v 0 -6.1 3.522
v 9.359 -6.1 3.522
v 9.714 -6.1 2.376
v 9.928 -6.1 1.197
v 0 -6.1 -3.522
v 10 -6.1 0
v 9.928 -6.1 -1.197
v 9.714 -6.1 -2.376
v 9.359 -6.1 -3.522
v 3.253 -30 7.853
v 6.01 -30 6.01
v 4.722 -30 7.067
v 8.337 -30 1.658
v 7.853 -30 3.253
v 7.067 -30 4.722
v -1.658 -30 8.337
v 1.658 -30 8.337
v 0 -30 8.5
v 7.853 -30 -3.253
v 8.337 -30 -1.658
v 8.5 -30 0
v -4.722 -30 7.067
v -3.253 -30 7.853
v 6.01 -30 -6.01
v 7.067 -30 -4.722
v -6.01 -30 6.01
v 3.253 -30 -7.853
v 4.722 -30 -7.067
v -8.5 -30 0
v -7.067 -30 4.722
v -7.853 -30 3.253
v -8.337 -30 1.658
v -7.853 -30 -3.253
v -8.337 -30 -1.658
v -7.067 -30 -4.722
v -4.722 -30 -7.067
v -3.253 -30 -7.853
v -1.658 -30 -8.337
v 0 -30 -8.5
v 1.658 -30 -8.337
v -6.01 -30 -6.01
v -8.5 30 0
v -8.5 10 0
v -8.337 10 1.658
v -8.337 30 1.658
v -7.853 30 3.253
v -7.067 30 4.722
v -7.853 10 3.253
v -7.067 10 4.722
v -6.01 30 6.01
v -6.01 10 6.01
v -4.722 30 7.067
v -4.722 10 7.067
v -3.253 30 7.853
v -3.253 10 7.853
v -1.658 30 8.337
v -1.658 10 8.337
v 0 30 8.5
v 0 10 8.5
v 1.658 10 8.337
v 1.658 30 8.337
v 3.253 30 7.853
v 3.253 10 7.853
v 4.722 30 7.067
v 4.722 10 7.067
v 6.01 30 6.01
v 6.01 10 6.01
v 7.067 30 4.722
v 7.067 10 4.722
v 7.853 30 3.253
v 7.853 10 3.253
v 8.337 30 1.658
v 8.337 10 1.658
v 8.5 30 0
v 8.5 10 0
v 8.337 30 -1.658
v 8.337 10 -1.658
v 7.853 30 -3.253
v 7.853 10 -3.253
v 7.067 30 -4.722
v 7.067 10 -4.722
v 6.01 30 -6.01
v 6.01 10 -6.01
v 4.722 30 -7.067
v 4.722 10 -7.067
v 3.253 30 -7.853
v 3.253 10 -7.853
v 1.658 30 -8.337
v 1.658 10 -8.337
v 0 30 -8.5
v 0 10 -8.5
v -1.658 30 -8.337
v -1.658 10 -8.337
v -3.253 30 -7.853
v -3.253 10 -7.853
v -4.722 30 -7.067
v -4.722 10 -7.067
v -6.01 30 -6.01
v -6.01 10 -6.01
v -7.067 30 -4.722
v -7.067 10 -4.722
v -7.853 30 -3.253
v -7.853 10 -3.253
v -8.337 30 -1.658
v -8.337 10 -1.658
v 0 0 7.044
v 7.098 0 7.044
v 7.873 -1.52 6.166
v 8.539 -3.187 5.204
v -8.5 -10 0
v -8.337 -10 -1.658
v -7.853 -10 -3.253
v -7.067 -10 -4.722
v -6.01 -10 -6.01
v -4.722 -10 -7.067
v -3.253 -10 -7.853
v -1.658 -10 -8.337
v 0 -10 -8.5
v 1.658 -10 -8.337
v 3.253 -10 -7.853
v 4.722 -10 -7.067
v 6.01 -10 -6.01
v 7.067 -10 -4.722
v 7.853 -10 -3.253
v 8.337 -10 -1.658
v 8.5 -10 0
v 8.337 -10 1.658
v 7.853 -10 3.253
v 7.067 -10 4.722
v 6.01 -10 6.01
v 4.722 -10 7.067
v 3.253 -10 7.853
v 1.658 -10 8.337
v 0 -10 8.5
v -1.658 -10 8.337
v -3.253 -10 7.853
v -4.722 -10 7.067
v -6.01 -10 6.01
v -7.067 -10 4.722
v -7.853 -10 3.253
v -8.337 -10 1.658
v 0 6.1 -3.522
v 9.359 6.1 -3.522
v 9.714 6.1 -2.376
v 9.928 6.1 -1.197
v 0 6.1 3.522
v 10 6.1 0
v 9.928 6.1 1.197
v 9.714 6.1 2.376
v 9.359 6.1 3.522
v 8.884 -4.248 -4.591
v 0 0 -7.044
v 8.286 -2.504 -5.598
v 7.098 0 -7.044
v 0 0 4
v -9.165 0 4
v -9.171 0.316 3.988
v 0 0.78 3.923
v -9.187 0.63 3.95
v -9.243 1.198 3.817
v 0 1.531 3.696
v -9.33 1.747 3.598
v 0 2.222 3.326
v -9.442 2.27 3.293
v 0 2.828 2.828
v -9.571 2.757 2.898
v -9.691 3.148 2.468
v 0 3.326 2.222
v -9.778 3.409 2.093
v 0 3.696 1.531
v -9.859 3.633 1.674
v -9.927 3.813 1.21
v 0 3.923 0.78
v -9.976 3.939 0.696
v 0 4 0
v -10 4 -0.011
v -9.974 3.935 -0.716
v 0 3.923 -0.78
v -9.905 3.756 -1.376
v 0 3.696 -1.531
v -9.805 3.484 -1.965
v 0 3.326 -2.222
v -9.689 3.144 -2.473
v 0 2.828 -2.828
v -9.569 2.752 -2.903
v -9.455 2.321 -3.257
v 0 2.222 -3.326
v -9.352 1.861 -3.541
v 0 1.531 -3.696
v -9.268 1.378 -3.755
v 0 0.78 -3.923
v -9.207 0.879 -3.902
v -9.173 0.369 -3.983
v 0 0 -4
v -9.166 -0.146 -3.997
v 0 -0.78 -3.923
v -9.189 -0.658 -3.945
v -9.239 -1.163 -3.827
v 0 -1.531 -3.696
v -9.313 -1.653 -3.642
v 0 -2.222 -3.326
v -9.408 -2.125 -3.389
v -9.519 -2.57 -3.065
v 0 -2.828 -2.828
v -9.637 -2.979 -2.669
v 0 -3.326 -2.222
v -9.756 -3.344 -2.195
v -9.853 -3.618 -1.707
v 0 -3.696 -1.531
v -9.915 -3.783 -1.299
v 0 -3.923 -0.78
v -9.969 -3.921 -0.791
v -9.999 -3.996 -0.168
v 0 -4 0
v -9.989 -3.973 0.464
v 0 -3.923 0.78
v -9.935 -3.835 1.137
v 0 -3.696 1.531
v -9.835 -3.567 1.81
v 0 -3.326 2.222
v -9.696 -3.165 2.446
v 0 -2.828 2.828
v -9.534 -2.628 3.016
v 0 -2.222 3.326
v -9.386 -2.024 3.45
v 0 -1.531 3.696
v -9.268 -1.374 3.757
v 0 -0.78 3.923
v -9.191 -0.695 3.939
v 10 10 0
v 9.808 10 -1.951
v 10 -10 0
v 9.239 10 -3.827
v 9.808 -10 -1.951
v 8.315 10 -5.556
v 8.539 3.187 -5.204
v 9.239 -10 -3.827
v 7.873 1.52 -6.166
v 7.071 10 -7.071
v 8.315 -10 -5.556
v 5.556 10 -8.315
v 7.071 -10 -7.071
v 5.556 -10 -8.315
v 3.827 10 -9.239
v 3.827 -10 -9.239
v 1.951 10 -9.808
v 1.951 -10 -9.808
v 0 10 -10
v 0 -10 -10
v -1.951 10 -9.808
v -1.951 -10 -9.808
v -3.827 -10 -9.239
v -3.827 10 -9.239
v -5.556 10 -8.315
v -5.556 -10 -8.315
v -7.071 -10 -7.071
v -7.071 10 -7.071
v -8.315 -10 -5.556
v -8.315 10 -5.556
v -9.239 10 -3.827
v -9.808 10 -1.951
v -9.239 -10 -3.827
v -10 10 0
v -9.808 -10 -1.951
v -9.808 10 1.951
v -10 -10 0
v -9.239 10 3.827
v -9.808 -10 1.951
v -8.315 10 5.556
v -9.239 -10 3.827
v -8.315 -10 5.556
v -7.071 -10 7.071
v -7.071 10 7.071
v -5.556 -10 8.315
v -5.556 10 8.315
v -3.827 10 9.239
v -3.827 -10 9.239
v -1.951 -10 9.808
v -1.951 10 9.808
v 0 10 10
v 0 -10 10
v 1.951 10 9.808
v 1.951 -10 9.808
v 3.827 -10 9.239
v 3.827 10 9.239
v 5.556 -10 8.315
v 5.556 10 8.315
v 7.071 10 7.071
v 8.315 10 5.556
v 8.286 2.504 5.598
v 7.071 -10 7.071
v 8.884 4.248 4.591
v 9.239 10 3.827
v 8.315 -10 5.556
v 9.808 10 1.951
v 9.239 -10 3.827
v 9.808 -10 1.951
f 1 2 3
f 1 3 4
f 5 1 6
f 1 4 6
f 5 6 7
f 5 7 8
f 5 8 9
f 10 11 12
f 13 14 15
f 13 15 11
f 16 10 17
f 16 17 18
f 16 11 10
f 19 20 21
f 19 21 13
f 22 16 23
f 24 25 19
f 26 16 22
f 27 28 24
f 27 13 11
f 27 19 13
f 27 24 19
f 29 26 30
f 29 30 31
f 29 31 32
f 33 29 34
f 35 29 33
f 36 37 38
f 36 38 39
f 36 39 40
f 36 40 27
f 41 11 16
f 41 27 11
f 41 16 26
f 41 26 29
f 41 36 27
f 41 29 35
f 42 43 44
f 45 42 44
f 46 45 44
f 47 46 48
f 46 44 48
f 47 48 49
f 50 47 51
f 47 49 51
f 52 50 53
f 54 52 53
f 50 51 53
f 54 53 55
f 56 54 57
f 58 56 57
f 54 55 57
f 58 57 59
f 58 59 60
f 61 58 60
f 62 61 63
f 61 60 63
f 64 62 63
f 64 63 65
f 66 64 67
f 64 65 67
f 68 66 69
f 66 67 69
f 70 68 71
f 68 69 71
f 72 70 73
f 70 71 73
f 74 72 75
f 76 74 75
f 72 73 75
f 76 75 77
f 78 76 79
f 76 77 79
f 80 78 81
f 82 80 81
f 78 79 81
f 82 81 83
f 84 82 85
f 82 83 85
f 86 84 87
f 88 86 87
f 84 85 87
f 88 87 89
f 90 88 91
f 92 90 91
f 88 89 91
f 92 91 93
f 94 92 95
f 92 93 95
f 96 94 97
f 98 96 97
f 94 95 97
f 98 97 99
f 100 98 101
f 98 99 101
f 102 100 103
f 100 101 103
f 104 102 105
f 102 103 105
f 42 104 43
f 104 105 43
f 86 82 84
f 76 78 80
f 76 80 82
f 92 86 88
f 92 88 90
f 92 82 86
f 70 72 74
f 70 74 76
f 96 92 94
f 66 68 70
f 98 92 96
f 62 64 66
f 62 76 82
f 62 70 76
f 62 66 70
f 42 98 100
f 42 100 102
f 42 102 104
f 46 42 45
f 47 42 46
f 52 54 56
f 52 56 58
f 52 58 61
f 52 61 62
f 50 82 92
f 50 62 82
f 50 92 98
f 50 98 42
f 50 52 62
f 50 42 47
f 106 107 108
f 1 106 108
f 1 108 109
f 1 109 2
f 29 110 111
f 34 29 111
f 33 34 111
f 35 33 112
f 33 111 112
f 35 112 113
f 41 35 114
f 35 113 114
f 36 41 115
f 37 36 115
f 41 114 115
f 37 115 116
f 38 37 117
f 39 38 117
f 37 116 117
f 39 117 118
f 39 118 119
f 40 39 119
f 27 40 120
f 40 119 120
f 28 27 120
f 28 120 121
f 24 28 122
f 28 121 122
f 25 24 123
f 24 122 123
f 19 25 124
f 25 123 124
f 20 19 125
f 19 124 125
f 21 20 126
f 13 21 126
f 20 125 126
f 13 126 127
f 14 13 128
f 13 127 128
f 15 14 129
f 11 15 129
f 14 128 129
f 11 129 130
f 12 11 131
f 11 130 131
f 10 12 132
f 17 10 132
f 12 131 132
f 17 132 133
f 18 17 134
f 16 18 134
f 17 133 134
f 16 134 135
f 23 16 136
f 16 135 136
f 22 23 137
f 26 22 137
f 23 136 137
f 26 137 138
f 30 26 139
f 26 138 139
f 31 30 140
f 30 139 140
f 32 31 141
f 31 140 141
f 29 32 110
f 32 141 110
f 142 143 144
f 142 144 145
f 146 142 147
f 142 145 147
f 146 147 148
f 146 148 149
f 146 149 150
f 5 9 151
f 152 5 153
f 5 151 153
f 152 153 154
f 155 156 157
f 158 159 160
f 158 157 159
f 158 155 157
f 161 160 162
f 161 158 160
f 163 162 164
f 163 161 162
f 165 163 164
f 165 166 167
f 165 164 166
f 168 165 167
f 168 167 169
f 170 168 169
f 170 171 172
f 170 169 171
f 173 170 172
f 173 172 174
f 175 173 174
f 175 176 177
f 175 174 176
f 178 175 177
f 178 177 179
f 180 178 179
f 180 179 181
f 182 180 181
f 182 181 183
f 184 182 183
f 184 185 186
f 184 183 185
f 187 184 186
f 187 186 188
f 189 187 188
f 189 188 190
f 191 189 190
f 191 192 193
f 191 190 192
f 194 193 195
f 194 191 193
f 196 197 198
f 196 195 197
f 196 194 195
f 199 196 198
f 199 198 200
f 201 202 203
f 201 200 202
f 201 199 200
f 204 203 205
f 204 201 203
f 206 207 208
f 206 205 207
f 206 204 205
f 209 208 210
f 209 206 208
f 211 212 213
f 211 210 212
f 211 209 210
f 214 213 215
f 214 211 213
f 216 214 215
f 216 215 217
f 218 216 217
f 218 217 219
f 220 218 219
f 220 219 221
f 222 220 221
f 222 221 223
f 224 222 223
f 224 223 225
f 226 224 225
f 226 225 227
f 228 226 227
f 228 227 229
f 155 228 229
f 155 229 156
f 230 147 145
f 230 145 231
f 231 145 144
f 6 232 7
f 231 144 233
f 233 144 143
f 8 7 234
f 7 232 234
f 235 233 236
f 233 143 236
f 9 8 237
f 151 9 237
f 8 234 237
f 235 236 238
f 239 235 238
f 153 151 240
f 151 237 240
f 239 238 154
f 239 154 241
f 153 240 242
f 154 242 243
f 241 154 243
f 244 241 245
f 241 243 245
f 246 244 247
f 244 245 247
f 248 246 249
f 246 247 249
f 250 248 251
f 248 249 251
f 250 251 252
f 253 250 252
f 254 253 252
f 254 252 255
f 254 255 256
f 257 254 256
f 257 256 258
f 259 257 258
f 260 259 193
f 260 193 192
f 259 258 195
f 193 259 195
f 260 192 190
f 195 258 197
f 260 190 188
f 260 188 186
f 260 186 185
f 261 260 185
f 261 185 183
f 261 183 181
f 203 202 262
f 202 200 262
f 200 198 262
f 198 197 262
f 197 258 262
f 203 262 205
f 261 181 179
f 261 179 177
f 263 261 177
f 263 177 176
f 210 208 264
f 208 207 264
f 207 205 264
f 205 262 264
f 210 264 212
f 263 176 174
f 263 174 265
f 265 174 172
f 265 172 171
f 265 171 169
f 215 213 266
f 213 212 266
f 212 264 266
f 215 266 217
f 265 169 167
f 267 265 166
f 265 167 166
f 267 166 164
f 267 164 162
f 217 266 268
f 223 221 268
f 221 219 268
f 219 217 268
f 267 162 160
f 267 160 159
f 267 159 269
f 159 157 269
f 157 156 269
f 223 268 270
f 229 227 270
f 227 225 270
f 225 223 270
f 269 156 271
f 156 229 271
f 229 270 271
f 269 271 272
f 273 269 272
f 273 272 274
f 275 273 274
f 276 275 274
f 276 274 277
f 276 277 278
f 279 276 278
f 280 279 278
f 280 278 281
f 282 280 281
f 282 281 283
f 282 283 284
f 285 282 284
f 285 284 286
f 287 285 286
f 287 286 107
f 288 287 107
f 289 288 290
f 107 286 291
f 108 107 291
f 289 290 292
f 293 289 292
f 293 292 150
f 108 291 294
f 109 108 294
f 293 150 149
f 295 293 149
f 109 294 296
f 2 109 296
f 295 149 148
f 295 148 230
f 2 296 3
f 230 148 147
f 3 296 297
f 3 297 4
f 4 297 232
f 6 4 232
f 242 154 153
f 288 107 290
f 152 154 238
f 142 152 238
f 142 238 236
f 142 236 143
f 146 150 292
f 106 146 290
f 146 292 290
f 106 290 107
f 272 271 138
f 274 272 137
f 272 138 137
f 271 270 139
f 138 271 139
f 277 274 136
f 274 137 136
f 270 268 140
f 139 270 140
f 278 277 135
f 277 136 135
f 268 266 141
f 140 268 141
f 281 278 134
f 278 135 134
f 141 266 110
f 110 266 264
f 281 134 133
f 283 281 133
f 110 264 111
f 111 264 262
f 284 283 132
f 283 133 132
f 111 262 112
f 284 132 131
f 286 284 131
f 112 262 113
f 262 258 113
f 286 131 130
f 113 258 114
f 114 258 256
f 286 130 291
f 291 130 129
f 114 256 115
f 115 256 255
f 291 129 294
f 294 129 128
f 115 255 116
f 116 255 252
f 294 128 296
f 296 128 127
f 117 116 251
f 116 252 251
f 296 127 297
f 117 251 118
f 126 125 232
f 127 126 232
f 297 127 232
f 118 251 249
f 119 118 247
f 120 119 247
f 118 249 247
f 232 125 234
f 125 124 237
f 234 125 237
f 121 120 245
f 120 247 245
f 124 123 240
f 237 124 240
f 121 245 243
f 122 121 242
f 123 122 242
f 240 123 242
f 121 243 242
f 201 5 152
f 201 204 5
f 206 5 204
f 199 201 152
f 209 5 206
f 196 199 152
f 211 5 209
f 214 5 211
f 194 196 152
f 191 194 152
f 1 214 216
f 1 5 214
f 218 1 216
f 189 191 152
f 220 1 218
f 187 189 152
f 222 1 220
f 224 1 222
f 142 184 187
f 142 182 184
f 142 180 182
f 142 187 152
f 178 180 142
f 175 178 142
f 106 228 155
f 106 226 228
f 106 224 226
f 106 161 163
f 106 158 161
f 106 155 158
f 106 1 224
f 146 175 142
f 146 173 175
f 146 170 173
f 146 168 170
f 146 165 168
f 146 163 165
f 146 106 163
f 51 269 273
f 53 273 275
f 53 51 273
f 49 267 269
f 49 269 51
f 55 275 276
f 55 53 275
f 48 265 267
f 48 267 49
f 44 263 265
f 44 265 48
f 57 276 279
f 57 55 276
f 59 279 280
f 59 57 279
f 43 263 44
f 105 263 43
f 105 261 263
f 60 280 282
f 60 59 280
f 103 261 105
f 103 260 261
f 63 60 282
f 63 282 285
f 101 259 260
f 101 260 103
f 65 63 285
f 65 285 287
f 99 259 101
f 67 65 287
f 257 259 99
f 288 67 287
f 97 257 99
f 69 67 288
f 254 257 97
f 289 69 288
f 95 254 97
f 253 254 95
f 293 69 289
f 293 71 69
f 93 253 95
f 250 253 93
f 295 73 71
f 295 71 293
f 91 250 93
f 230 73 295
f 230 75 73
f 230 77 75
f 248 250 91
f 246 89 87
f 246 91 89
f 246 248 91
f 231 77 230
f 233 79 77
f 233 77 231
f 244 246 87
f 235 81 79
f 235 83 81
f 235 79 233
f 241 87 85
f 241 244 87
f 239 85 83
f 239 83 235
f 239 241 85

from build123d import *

# Parameters (mm, degrees)
CYLINDER001_R     = 4
CYLINDER001_DEPTH = 20
PAD_DEPTH         = 10
CYLINDER_R        = 10
CYLINDER_DEPTH    = 20
CYLINDER005_R     = 8.5
CYLINDER005_DEPTH = 20
CYLINDER004_R     = 8.5
CYLINDER004_DEPTH = 20


with BuildPart() as cylinder001:
    # Cylinder001 → Cylinder001 (new body)
    with BuildSketch(Plane.ZY.offset(-10)):
        Circle(CYLINDER001_R)
    extrude(amount=CYLINDER001_DEPTH)


with BuildPart() as negative_fusion:
    # Sketch → Pad (new body)
    with BuildSketch(Plane.YZ):
        Polygon((6.1, -3.521837), (6.1, 3.521837), (0, 7.043673), (-6.1, 3.521837), (-6.1, -3.521837), (0, -7.043673), align=None)
    extrude(amount=-PAD_DEPTH)


with BuildPart() as negative_fusion_1:
    # Body placement: moved
    add(negative_fusion.part.moved(Location((10, 0, 0))))

    # Fusion: union Cylinder001
    add(cylinder001.part)


with BuildPart() as cylinder:
    # Cylinder → Cylinder (new body)
    with BuildSketch(Plane(origin=(0, -10, 0), x_dir=(1, 0, 0), z_dir=(0, 1, 0))):
        Circle(CYLINDER_R)
    extrude(amount=CYLINDER_DEPTH)


with BuildPart() as cylinder005:
    # Cylinder005 → Cylinder005 (new body)
    with BuildSketch(Plane(origin=(0, 10, 0), x_dir=(-1, 0, 0), z_dir=(0, 1, 0))):
        Circle(CYLINDER005_R)
    extrude(amount=CYLINDER005_DEPTH)


with BuildPart() as cut:
    # Cylinder004 → Cylinder004 (new body)
    with BuildSketch(Plane(origin=(0, -10, 0), x_dir=(-1, 0, 0), z_dir=(0, -1, 0))):
        Circle(CYLINDER004_R)
    extrude(amount=CYLINDER004_DEPTH)

    # Fusion001: union Cylinder, Cylinder005
    add(cylinder.part)
    add(cylinder005.part)

    # Cut: cut Negative Fusion
    add(negative_fusion_1.part, mode=Mode.SUBTRACT)


solid = cut.part
